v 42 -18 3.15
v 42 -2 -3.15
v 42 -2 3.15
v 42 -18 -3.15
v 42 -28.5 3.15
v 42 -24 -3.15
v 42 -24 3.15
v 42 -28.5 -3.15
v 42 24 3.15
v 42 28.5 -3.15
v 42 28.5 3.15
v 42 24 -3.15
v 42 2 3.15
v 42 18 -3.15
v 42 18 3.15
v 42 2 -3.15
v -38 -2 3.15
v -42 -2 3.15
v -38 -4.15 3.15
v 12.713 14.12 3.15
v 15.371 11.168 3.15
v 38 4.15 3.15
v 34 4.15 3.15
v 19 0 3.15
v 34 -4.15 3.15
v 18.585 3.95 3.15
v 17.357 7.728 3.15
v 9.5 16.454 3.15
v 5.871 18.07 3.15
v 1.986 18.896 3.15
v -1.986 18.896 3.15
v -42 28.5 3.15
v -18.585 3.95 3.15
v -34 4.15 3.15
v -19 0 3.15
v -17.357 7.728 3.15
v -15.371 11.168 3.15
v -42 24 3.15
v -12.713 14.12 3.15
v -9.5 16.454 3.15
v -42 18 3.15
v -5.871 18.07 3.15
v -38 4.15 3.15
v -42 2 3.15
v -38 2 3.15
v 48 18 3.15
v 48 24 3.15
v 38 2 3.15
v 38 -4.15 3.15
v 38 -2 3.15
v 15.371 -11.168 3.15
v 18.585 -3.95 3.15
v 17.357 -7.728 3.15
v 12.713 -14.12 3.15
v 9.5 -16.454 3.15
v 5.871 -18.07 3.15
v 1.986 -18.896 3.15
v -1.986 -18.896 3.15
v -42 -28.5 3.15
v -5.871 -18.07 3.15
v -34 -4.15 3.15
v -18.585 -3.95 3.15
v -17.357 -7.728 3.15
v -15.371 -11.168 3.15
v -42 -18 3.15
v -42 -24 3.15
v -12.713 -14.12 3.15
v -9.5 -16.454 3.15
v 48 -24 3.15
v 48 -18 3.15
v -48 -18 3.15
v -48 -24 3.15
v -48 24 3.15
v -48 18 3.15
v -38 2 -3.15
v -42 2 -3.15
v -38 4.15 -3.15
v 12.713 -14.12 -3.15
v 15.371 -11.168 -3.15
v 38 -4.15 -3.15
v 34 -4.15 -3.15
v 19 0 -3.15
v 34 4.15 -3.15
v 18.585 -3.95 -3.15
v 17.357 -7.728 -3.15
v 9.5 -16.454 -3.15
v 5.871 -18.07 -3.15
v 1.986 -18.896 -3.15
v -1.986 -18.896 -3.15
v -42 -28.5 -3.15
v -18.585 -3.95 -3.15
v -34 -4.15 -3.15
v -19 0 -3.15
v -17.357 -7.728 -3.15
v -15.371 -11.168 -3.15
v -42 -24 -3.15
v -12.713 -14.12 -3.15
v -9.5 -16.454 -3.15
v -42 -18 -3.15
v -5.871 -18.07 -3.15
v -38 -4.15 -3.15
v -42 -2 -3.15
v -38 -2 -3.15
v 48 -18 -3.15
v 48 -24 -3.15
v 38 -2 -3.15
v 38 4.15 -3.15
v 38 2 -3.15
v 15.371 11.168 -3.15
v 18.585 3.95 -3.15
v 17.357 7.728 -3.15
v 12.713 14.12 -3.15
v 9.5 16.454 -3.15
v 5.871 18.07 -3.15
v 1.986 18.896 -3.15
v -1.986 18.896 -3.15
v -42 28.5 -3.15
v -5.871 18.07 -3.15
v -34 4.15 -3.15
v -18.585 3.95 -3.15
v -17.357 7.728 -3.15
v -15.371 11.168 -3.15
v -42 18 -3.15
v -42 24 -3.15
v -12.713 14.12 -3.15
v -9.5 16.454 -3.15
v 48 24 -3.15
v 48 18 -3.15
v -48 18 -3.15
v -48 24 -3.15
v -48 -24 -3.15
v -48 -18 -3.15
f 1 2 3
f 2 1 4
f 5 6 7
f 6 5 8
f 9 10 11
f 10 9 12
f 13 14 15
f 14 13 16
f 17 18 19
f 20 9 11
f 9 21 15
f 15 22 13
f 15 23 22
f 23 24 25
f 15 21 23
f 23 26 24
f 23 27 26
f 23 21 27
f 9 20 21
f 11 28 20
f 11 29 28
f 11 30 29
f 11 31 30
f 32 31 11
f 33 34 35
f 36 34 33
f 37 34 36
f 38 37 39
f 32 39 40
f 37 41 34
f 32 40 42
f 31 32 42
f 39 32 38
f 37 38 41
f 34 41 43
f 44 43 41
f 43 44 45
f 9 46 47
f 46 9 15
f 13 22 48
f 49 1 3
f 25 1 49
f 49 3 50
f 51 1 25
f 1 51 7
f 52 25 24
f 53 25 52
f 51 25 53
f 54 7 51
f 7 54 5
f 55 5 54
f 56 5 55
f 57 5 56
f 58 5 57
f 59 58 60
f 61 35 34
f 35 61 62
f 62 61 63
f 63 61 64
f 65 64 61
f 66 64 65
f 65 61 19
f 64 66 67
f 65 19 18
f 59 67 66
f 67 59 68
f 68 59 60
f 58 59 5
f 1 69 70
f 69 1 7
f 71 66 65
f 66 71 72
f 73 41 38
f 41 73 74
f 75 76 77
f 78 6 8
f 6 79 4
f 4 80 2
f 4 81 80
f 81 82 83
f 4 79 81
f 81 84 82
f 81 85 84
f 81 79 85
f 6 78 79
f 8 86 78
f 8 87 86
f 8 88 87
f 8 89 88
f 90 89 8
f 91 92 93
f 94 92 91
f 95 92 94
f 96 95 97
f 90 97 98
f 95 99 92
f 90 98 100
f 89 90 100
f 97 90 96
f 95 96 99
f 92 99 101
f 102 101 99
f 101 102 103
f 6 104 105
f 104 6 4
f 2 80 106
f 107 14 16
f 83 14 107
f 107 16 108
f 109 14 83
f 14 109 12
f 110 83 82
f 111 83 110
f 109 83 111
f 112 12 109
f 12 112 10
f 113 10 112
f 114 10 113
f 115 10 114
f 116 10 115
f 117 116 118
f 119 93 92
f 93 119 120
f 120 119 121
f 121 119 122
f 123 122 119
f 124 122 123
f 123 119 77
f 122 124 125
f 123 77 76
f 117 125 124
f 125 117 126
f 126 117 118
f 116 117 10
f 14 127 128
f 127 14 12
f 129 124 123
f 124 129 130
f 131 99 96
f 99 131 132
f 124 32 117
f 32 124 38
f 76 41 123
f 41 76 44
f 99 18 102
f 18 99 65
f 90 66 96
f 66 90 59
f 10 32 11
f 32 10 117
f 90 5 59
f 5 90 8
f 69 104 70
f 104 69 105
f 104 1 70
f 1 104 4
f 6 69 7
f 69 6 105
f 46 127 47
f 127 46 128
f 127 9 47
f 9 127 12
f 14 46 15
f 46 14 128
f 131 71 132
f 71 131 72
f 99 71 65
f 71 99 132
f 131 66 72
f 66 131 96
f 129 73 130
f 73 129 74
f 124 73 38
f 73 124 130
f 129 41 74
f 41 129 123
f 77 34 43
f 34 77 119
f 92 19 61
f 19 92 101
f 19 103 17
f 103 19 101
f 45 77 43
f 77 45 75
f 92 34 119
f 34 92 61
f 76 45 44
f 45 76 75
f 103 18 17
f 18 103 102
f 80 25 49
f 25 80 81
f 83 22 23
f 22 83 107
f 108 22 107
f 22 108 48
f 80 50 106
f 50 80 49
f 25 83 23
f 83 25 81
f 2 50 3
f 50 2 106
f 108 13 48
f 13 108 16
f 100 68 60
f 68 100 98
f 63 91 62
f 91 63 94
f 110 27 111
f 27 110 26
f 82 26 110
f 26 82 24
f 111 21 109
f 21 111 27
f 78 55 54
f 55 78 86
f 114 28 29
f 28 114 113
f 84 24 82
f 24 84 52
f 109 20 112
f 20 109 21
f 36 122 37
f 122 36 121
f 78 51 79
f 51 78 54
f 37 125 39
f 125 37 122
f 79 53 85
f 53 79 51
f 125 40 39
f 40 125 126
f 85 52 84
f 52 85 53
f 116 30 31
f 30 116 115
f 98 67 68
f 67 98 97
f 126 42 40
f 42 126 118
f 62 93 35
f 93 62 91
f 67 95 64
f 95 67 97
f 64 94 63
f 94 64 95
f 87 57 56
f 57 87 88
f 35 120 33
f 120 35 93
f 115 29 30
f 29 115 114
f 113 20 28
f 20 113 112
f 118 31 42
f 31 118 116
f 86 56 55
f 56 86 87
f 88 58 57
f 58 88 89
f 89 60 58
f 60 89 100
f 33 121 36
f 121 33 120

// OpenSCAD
// Spacer for PrintrBot spool roller
height = 6.3;

base_width = 84;
base_depth = 57;

screw_diameter = 4;
screw_depth = 4;

nub_width = 6;
nub_depth = 6;

// Insert vars
insert_width = 8.3;
insert_depth = 4;
insert_offset = (base_width/2 - screw_diameter * 1.5);

module nub () {
	cube ( [ nub_width, nub_depth, height ], center=true );
}


module base () {
	// Actual spacer
	union () {
		cube( [ base_width, base_depth, height ], center=true );
		translate ( [ base_width/2 + nub_width/2, -21, 0 ] ) { nub(); }
		translate ( [ base_width/2 + nub_width/2, 21, 0 ] ) { nub(); }
		translate ( [ -(base_width/2 + nub_width/2), -21, 0 ] ) { nub(); }
		translate ( [ -(base_width/2 + nub_width/2), 21, 0 ] ) { nub(); }
	} // end union
}


module insert () {
	// Insert nut and screw bolt into place
	// Firmly attaches roller sides to spacer
	union () {
		cube ( [ insert_width, insert_depth, height ], center=true );
		translate ( [ 0,4,0 ] ) {
			cube ( [ screw_diameter, screw_depth, height ], center=true );
		} // end translate
	} // end union
}

difference () {
	
	base();
	translate( [ -insert_offset,0,0 ] ) { rotate ( [ 0,0,90 ] ) { insert(); } }
	translate( [ insert_offset,0,0 ] ) { rotate ( [ 0,0,270 ] ) { insert(); } }
	cylinder ( height, r=base_depth/3, center=true);
}
